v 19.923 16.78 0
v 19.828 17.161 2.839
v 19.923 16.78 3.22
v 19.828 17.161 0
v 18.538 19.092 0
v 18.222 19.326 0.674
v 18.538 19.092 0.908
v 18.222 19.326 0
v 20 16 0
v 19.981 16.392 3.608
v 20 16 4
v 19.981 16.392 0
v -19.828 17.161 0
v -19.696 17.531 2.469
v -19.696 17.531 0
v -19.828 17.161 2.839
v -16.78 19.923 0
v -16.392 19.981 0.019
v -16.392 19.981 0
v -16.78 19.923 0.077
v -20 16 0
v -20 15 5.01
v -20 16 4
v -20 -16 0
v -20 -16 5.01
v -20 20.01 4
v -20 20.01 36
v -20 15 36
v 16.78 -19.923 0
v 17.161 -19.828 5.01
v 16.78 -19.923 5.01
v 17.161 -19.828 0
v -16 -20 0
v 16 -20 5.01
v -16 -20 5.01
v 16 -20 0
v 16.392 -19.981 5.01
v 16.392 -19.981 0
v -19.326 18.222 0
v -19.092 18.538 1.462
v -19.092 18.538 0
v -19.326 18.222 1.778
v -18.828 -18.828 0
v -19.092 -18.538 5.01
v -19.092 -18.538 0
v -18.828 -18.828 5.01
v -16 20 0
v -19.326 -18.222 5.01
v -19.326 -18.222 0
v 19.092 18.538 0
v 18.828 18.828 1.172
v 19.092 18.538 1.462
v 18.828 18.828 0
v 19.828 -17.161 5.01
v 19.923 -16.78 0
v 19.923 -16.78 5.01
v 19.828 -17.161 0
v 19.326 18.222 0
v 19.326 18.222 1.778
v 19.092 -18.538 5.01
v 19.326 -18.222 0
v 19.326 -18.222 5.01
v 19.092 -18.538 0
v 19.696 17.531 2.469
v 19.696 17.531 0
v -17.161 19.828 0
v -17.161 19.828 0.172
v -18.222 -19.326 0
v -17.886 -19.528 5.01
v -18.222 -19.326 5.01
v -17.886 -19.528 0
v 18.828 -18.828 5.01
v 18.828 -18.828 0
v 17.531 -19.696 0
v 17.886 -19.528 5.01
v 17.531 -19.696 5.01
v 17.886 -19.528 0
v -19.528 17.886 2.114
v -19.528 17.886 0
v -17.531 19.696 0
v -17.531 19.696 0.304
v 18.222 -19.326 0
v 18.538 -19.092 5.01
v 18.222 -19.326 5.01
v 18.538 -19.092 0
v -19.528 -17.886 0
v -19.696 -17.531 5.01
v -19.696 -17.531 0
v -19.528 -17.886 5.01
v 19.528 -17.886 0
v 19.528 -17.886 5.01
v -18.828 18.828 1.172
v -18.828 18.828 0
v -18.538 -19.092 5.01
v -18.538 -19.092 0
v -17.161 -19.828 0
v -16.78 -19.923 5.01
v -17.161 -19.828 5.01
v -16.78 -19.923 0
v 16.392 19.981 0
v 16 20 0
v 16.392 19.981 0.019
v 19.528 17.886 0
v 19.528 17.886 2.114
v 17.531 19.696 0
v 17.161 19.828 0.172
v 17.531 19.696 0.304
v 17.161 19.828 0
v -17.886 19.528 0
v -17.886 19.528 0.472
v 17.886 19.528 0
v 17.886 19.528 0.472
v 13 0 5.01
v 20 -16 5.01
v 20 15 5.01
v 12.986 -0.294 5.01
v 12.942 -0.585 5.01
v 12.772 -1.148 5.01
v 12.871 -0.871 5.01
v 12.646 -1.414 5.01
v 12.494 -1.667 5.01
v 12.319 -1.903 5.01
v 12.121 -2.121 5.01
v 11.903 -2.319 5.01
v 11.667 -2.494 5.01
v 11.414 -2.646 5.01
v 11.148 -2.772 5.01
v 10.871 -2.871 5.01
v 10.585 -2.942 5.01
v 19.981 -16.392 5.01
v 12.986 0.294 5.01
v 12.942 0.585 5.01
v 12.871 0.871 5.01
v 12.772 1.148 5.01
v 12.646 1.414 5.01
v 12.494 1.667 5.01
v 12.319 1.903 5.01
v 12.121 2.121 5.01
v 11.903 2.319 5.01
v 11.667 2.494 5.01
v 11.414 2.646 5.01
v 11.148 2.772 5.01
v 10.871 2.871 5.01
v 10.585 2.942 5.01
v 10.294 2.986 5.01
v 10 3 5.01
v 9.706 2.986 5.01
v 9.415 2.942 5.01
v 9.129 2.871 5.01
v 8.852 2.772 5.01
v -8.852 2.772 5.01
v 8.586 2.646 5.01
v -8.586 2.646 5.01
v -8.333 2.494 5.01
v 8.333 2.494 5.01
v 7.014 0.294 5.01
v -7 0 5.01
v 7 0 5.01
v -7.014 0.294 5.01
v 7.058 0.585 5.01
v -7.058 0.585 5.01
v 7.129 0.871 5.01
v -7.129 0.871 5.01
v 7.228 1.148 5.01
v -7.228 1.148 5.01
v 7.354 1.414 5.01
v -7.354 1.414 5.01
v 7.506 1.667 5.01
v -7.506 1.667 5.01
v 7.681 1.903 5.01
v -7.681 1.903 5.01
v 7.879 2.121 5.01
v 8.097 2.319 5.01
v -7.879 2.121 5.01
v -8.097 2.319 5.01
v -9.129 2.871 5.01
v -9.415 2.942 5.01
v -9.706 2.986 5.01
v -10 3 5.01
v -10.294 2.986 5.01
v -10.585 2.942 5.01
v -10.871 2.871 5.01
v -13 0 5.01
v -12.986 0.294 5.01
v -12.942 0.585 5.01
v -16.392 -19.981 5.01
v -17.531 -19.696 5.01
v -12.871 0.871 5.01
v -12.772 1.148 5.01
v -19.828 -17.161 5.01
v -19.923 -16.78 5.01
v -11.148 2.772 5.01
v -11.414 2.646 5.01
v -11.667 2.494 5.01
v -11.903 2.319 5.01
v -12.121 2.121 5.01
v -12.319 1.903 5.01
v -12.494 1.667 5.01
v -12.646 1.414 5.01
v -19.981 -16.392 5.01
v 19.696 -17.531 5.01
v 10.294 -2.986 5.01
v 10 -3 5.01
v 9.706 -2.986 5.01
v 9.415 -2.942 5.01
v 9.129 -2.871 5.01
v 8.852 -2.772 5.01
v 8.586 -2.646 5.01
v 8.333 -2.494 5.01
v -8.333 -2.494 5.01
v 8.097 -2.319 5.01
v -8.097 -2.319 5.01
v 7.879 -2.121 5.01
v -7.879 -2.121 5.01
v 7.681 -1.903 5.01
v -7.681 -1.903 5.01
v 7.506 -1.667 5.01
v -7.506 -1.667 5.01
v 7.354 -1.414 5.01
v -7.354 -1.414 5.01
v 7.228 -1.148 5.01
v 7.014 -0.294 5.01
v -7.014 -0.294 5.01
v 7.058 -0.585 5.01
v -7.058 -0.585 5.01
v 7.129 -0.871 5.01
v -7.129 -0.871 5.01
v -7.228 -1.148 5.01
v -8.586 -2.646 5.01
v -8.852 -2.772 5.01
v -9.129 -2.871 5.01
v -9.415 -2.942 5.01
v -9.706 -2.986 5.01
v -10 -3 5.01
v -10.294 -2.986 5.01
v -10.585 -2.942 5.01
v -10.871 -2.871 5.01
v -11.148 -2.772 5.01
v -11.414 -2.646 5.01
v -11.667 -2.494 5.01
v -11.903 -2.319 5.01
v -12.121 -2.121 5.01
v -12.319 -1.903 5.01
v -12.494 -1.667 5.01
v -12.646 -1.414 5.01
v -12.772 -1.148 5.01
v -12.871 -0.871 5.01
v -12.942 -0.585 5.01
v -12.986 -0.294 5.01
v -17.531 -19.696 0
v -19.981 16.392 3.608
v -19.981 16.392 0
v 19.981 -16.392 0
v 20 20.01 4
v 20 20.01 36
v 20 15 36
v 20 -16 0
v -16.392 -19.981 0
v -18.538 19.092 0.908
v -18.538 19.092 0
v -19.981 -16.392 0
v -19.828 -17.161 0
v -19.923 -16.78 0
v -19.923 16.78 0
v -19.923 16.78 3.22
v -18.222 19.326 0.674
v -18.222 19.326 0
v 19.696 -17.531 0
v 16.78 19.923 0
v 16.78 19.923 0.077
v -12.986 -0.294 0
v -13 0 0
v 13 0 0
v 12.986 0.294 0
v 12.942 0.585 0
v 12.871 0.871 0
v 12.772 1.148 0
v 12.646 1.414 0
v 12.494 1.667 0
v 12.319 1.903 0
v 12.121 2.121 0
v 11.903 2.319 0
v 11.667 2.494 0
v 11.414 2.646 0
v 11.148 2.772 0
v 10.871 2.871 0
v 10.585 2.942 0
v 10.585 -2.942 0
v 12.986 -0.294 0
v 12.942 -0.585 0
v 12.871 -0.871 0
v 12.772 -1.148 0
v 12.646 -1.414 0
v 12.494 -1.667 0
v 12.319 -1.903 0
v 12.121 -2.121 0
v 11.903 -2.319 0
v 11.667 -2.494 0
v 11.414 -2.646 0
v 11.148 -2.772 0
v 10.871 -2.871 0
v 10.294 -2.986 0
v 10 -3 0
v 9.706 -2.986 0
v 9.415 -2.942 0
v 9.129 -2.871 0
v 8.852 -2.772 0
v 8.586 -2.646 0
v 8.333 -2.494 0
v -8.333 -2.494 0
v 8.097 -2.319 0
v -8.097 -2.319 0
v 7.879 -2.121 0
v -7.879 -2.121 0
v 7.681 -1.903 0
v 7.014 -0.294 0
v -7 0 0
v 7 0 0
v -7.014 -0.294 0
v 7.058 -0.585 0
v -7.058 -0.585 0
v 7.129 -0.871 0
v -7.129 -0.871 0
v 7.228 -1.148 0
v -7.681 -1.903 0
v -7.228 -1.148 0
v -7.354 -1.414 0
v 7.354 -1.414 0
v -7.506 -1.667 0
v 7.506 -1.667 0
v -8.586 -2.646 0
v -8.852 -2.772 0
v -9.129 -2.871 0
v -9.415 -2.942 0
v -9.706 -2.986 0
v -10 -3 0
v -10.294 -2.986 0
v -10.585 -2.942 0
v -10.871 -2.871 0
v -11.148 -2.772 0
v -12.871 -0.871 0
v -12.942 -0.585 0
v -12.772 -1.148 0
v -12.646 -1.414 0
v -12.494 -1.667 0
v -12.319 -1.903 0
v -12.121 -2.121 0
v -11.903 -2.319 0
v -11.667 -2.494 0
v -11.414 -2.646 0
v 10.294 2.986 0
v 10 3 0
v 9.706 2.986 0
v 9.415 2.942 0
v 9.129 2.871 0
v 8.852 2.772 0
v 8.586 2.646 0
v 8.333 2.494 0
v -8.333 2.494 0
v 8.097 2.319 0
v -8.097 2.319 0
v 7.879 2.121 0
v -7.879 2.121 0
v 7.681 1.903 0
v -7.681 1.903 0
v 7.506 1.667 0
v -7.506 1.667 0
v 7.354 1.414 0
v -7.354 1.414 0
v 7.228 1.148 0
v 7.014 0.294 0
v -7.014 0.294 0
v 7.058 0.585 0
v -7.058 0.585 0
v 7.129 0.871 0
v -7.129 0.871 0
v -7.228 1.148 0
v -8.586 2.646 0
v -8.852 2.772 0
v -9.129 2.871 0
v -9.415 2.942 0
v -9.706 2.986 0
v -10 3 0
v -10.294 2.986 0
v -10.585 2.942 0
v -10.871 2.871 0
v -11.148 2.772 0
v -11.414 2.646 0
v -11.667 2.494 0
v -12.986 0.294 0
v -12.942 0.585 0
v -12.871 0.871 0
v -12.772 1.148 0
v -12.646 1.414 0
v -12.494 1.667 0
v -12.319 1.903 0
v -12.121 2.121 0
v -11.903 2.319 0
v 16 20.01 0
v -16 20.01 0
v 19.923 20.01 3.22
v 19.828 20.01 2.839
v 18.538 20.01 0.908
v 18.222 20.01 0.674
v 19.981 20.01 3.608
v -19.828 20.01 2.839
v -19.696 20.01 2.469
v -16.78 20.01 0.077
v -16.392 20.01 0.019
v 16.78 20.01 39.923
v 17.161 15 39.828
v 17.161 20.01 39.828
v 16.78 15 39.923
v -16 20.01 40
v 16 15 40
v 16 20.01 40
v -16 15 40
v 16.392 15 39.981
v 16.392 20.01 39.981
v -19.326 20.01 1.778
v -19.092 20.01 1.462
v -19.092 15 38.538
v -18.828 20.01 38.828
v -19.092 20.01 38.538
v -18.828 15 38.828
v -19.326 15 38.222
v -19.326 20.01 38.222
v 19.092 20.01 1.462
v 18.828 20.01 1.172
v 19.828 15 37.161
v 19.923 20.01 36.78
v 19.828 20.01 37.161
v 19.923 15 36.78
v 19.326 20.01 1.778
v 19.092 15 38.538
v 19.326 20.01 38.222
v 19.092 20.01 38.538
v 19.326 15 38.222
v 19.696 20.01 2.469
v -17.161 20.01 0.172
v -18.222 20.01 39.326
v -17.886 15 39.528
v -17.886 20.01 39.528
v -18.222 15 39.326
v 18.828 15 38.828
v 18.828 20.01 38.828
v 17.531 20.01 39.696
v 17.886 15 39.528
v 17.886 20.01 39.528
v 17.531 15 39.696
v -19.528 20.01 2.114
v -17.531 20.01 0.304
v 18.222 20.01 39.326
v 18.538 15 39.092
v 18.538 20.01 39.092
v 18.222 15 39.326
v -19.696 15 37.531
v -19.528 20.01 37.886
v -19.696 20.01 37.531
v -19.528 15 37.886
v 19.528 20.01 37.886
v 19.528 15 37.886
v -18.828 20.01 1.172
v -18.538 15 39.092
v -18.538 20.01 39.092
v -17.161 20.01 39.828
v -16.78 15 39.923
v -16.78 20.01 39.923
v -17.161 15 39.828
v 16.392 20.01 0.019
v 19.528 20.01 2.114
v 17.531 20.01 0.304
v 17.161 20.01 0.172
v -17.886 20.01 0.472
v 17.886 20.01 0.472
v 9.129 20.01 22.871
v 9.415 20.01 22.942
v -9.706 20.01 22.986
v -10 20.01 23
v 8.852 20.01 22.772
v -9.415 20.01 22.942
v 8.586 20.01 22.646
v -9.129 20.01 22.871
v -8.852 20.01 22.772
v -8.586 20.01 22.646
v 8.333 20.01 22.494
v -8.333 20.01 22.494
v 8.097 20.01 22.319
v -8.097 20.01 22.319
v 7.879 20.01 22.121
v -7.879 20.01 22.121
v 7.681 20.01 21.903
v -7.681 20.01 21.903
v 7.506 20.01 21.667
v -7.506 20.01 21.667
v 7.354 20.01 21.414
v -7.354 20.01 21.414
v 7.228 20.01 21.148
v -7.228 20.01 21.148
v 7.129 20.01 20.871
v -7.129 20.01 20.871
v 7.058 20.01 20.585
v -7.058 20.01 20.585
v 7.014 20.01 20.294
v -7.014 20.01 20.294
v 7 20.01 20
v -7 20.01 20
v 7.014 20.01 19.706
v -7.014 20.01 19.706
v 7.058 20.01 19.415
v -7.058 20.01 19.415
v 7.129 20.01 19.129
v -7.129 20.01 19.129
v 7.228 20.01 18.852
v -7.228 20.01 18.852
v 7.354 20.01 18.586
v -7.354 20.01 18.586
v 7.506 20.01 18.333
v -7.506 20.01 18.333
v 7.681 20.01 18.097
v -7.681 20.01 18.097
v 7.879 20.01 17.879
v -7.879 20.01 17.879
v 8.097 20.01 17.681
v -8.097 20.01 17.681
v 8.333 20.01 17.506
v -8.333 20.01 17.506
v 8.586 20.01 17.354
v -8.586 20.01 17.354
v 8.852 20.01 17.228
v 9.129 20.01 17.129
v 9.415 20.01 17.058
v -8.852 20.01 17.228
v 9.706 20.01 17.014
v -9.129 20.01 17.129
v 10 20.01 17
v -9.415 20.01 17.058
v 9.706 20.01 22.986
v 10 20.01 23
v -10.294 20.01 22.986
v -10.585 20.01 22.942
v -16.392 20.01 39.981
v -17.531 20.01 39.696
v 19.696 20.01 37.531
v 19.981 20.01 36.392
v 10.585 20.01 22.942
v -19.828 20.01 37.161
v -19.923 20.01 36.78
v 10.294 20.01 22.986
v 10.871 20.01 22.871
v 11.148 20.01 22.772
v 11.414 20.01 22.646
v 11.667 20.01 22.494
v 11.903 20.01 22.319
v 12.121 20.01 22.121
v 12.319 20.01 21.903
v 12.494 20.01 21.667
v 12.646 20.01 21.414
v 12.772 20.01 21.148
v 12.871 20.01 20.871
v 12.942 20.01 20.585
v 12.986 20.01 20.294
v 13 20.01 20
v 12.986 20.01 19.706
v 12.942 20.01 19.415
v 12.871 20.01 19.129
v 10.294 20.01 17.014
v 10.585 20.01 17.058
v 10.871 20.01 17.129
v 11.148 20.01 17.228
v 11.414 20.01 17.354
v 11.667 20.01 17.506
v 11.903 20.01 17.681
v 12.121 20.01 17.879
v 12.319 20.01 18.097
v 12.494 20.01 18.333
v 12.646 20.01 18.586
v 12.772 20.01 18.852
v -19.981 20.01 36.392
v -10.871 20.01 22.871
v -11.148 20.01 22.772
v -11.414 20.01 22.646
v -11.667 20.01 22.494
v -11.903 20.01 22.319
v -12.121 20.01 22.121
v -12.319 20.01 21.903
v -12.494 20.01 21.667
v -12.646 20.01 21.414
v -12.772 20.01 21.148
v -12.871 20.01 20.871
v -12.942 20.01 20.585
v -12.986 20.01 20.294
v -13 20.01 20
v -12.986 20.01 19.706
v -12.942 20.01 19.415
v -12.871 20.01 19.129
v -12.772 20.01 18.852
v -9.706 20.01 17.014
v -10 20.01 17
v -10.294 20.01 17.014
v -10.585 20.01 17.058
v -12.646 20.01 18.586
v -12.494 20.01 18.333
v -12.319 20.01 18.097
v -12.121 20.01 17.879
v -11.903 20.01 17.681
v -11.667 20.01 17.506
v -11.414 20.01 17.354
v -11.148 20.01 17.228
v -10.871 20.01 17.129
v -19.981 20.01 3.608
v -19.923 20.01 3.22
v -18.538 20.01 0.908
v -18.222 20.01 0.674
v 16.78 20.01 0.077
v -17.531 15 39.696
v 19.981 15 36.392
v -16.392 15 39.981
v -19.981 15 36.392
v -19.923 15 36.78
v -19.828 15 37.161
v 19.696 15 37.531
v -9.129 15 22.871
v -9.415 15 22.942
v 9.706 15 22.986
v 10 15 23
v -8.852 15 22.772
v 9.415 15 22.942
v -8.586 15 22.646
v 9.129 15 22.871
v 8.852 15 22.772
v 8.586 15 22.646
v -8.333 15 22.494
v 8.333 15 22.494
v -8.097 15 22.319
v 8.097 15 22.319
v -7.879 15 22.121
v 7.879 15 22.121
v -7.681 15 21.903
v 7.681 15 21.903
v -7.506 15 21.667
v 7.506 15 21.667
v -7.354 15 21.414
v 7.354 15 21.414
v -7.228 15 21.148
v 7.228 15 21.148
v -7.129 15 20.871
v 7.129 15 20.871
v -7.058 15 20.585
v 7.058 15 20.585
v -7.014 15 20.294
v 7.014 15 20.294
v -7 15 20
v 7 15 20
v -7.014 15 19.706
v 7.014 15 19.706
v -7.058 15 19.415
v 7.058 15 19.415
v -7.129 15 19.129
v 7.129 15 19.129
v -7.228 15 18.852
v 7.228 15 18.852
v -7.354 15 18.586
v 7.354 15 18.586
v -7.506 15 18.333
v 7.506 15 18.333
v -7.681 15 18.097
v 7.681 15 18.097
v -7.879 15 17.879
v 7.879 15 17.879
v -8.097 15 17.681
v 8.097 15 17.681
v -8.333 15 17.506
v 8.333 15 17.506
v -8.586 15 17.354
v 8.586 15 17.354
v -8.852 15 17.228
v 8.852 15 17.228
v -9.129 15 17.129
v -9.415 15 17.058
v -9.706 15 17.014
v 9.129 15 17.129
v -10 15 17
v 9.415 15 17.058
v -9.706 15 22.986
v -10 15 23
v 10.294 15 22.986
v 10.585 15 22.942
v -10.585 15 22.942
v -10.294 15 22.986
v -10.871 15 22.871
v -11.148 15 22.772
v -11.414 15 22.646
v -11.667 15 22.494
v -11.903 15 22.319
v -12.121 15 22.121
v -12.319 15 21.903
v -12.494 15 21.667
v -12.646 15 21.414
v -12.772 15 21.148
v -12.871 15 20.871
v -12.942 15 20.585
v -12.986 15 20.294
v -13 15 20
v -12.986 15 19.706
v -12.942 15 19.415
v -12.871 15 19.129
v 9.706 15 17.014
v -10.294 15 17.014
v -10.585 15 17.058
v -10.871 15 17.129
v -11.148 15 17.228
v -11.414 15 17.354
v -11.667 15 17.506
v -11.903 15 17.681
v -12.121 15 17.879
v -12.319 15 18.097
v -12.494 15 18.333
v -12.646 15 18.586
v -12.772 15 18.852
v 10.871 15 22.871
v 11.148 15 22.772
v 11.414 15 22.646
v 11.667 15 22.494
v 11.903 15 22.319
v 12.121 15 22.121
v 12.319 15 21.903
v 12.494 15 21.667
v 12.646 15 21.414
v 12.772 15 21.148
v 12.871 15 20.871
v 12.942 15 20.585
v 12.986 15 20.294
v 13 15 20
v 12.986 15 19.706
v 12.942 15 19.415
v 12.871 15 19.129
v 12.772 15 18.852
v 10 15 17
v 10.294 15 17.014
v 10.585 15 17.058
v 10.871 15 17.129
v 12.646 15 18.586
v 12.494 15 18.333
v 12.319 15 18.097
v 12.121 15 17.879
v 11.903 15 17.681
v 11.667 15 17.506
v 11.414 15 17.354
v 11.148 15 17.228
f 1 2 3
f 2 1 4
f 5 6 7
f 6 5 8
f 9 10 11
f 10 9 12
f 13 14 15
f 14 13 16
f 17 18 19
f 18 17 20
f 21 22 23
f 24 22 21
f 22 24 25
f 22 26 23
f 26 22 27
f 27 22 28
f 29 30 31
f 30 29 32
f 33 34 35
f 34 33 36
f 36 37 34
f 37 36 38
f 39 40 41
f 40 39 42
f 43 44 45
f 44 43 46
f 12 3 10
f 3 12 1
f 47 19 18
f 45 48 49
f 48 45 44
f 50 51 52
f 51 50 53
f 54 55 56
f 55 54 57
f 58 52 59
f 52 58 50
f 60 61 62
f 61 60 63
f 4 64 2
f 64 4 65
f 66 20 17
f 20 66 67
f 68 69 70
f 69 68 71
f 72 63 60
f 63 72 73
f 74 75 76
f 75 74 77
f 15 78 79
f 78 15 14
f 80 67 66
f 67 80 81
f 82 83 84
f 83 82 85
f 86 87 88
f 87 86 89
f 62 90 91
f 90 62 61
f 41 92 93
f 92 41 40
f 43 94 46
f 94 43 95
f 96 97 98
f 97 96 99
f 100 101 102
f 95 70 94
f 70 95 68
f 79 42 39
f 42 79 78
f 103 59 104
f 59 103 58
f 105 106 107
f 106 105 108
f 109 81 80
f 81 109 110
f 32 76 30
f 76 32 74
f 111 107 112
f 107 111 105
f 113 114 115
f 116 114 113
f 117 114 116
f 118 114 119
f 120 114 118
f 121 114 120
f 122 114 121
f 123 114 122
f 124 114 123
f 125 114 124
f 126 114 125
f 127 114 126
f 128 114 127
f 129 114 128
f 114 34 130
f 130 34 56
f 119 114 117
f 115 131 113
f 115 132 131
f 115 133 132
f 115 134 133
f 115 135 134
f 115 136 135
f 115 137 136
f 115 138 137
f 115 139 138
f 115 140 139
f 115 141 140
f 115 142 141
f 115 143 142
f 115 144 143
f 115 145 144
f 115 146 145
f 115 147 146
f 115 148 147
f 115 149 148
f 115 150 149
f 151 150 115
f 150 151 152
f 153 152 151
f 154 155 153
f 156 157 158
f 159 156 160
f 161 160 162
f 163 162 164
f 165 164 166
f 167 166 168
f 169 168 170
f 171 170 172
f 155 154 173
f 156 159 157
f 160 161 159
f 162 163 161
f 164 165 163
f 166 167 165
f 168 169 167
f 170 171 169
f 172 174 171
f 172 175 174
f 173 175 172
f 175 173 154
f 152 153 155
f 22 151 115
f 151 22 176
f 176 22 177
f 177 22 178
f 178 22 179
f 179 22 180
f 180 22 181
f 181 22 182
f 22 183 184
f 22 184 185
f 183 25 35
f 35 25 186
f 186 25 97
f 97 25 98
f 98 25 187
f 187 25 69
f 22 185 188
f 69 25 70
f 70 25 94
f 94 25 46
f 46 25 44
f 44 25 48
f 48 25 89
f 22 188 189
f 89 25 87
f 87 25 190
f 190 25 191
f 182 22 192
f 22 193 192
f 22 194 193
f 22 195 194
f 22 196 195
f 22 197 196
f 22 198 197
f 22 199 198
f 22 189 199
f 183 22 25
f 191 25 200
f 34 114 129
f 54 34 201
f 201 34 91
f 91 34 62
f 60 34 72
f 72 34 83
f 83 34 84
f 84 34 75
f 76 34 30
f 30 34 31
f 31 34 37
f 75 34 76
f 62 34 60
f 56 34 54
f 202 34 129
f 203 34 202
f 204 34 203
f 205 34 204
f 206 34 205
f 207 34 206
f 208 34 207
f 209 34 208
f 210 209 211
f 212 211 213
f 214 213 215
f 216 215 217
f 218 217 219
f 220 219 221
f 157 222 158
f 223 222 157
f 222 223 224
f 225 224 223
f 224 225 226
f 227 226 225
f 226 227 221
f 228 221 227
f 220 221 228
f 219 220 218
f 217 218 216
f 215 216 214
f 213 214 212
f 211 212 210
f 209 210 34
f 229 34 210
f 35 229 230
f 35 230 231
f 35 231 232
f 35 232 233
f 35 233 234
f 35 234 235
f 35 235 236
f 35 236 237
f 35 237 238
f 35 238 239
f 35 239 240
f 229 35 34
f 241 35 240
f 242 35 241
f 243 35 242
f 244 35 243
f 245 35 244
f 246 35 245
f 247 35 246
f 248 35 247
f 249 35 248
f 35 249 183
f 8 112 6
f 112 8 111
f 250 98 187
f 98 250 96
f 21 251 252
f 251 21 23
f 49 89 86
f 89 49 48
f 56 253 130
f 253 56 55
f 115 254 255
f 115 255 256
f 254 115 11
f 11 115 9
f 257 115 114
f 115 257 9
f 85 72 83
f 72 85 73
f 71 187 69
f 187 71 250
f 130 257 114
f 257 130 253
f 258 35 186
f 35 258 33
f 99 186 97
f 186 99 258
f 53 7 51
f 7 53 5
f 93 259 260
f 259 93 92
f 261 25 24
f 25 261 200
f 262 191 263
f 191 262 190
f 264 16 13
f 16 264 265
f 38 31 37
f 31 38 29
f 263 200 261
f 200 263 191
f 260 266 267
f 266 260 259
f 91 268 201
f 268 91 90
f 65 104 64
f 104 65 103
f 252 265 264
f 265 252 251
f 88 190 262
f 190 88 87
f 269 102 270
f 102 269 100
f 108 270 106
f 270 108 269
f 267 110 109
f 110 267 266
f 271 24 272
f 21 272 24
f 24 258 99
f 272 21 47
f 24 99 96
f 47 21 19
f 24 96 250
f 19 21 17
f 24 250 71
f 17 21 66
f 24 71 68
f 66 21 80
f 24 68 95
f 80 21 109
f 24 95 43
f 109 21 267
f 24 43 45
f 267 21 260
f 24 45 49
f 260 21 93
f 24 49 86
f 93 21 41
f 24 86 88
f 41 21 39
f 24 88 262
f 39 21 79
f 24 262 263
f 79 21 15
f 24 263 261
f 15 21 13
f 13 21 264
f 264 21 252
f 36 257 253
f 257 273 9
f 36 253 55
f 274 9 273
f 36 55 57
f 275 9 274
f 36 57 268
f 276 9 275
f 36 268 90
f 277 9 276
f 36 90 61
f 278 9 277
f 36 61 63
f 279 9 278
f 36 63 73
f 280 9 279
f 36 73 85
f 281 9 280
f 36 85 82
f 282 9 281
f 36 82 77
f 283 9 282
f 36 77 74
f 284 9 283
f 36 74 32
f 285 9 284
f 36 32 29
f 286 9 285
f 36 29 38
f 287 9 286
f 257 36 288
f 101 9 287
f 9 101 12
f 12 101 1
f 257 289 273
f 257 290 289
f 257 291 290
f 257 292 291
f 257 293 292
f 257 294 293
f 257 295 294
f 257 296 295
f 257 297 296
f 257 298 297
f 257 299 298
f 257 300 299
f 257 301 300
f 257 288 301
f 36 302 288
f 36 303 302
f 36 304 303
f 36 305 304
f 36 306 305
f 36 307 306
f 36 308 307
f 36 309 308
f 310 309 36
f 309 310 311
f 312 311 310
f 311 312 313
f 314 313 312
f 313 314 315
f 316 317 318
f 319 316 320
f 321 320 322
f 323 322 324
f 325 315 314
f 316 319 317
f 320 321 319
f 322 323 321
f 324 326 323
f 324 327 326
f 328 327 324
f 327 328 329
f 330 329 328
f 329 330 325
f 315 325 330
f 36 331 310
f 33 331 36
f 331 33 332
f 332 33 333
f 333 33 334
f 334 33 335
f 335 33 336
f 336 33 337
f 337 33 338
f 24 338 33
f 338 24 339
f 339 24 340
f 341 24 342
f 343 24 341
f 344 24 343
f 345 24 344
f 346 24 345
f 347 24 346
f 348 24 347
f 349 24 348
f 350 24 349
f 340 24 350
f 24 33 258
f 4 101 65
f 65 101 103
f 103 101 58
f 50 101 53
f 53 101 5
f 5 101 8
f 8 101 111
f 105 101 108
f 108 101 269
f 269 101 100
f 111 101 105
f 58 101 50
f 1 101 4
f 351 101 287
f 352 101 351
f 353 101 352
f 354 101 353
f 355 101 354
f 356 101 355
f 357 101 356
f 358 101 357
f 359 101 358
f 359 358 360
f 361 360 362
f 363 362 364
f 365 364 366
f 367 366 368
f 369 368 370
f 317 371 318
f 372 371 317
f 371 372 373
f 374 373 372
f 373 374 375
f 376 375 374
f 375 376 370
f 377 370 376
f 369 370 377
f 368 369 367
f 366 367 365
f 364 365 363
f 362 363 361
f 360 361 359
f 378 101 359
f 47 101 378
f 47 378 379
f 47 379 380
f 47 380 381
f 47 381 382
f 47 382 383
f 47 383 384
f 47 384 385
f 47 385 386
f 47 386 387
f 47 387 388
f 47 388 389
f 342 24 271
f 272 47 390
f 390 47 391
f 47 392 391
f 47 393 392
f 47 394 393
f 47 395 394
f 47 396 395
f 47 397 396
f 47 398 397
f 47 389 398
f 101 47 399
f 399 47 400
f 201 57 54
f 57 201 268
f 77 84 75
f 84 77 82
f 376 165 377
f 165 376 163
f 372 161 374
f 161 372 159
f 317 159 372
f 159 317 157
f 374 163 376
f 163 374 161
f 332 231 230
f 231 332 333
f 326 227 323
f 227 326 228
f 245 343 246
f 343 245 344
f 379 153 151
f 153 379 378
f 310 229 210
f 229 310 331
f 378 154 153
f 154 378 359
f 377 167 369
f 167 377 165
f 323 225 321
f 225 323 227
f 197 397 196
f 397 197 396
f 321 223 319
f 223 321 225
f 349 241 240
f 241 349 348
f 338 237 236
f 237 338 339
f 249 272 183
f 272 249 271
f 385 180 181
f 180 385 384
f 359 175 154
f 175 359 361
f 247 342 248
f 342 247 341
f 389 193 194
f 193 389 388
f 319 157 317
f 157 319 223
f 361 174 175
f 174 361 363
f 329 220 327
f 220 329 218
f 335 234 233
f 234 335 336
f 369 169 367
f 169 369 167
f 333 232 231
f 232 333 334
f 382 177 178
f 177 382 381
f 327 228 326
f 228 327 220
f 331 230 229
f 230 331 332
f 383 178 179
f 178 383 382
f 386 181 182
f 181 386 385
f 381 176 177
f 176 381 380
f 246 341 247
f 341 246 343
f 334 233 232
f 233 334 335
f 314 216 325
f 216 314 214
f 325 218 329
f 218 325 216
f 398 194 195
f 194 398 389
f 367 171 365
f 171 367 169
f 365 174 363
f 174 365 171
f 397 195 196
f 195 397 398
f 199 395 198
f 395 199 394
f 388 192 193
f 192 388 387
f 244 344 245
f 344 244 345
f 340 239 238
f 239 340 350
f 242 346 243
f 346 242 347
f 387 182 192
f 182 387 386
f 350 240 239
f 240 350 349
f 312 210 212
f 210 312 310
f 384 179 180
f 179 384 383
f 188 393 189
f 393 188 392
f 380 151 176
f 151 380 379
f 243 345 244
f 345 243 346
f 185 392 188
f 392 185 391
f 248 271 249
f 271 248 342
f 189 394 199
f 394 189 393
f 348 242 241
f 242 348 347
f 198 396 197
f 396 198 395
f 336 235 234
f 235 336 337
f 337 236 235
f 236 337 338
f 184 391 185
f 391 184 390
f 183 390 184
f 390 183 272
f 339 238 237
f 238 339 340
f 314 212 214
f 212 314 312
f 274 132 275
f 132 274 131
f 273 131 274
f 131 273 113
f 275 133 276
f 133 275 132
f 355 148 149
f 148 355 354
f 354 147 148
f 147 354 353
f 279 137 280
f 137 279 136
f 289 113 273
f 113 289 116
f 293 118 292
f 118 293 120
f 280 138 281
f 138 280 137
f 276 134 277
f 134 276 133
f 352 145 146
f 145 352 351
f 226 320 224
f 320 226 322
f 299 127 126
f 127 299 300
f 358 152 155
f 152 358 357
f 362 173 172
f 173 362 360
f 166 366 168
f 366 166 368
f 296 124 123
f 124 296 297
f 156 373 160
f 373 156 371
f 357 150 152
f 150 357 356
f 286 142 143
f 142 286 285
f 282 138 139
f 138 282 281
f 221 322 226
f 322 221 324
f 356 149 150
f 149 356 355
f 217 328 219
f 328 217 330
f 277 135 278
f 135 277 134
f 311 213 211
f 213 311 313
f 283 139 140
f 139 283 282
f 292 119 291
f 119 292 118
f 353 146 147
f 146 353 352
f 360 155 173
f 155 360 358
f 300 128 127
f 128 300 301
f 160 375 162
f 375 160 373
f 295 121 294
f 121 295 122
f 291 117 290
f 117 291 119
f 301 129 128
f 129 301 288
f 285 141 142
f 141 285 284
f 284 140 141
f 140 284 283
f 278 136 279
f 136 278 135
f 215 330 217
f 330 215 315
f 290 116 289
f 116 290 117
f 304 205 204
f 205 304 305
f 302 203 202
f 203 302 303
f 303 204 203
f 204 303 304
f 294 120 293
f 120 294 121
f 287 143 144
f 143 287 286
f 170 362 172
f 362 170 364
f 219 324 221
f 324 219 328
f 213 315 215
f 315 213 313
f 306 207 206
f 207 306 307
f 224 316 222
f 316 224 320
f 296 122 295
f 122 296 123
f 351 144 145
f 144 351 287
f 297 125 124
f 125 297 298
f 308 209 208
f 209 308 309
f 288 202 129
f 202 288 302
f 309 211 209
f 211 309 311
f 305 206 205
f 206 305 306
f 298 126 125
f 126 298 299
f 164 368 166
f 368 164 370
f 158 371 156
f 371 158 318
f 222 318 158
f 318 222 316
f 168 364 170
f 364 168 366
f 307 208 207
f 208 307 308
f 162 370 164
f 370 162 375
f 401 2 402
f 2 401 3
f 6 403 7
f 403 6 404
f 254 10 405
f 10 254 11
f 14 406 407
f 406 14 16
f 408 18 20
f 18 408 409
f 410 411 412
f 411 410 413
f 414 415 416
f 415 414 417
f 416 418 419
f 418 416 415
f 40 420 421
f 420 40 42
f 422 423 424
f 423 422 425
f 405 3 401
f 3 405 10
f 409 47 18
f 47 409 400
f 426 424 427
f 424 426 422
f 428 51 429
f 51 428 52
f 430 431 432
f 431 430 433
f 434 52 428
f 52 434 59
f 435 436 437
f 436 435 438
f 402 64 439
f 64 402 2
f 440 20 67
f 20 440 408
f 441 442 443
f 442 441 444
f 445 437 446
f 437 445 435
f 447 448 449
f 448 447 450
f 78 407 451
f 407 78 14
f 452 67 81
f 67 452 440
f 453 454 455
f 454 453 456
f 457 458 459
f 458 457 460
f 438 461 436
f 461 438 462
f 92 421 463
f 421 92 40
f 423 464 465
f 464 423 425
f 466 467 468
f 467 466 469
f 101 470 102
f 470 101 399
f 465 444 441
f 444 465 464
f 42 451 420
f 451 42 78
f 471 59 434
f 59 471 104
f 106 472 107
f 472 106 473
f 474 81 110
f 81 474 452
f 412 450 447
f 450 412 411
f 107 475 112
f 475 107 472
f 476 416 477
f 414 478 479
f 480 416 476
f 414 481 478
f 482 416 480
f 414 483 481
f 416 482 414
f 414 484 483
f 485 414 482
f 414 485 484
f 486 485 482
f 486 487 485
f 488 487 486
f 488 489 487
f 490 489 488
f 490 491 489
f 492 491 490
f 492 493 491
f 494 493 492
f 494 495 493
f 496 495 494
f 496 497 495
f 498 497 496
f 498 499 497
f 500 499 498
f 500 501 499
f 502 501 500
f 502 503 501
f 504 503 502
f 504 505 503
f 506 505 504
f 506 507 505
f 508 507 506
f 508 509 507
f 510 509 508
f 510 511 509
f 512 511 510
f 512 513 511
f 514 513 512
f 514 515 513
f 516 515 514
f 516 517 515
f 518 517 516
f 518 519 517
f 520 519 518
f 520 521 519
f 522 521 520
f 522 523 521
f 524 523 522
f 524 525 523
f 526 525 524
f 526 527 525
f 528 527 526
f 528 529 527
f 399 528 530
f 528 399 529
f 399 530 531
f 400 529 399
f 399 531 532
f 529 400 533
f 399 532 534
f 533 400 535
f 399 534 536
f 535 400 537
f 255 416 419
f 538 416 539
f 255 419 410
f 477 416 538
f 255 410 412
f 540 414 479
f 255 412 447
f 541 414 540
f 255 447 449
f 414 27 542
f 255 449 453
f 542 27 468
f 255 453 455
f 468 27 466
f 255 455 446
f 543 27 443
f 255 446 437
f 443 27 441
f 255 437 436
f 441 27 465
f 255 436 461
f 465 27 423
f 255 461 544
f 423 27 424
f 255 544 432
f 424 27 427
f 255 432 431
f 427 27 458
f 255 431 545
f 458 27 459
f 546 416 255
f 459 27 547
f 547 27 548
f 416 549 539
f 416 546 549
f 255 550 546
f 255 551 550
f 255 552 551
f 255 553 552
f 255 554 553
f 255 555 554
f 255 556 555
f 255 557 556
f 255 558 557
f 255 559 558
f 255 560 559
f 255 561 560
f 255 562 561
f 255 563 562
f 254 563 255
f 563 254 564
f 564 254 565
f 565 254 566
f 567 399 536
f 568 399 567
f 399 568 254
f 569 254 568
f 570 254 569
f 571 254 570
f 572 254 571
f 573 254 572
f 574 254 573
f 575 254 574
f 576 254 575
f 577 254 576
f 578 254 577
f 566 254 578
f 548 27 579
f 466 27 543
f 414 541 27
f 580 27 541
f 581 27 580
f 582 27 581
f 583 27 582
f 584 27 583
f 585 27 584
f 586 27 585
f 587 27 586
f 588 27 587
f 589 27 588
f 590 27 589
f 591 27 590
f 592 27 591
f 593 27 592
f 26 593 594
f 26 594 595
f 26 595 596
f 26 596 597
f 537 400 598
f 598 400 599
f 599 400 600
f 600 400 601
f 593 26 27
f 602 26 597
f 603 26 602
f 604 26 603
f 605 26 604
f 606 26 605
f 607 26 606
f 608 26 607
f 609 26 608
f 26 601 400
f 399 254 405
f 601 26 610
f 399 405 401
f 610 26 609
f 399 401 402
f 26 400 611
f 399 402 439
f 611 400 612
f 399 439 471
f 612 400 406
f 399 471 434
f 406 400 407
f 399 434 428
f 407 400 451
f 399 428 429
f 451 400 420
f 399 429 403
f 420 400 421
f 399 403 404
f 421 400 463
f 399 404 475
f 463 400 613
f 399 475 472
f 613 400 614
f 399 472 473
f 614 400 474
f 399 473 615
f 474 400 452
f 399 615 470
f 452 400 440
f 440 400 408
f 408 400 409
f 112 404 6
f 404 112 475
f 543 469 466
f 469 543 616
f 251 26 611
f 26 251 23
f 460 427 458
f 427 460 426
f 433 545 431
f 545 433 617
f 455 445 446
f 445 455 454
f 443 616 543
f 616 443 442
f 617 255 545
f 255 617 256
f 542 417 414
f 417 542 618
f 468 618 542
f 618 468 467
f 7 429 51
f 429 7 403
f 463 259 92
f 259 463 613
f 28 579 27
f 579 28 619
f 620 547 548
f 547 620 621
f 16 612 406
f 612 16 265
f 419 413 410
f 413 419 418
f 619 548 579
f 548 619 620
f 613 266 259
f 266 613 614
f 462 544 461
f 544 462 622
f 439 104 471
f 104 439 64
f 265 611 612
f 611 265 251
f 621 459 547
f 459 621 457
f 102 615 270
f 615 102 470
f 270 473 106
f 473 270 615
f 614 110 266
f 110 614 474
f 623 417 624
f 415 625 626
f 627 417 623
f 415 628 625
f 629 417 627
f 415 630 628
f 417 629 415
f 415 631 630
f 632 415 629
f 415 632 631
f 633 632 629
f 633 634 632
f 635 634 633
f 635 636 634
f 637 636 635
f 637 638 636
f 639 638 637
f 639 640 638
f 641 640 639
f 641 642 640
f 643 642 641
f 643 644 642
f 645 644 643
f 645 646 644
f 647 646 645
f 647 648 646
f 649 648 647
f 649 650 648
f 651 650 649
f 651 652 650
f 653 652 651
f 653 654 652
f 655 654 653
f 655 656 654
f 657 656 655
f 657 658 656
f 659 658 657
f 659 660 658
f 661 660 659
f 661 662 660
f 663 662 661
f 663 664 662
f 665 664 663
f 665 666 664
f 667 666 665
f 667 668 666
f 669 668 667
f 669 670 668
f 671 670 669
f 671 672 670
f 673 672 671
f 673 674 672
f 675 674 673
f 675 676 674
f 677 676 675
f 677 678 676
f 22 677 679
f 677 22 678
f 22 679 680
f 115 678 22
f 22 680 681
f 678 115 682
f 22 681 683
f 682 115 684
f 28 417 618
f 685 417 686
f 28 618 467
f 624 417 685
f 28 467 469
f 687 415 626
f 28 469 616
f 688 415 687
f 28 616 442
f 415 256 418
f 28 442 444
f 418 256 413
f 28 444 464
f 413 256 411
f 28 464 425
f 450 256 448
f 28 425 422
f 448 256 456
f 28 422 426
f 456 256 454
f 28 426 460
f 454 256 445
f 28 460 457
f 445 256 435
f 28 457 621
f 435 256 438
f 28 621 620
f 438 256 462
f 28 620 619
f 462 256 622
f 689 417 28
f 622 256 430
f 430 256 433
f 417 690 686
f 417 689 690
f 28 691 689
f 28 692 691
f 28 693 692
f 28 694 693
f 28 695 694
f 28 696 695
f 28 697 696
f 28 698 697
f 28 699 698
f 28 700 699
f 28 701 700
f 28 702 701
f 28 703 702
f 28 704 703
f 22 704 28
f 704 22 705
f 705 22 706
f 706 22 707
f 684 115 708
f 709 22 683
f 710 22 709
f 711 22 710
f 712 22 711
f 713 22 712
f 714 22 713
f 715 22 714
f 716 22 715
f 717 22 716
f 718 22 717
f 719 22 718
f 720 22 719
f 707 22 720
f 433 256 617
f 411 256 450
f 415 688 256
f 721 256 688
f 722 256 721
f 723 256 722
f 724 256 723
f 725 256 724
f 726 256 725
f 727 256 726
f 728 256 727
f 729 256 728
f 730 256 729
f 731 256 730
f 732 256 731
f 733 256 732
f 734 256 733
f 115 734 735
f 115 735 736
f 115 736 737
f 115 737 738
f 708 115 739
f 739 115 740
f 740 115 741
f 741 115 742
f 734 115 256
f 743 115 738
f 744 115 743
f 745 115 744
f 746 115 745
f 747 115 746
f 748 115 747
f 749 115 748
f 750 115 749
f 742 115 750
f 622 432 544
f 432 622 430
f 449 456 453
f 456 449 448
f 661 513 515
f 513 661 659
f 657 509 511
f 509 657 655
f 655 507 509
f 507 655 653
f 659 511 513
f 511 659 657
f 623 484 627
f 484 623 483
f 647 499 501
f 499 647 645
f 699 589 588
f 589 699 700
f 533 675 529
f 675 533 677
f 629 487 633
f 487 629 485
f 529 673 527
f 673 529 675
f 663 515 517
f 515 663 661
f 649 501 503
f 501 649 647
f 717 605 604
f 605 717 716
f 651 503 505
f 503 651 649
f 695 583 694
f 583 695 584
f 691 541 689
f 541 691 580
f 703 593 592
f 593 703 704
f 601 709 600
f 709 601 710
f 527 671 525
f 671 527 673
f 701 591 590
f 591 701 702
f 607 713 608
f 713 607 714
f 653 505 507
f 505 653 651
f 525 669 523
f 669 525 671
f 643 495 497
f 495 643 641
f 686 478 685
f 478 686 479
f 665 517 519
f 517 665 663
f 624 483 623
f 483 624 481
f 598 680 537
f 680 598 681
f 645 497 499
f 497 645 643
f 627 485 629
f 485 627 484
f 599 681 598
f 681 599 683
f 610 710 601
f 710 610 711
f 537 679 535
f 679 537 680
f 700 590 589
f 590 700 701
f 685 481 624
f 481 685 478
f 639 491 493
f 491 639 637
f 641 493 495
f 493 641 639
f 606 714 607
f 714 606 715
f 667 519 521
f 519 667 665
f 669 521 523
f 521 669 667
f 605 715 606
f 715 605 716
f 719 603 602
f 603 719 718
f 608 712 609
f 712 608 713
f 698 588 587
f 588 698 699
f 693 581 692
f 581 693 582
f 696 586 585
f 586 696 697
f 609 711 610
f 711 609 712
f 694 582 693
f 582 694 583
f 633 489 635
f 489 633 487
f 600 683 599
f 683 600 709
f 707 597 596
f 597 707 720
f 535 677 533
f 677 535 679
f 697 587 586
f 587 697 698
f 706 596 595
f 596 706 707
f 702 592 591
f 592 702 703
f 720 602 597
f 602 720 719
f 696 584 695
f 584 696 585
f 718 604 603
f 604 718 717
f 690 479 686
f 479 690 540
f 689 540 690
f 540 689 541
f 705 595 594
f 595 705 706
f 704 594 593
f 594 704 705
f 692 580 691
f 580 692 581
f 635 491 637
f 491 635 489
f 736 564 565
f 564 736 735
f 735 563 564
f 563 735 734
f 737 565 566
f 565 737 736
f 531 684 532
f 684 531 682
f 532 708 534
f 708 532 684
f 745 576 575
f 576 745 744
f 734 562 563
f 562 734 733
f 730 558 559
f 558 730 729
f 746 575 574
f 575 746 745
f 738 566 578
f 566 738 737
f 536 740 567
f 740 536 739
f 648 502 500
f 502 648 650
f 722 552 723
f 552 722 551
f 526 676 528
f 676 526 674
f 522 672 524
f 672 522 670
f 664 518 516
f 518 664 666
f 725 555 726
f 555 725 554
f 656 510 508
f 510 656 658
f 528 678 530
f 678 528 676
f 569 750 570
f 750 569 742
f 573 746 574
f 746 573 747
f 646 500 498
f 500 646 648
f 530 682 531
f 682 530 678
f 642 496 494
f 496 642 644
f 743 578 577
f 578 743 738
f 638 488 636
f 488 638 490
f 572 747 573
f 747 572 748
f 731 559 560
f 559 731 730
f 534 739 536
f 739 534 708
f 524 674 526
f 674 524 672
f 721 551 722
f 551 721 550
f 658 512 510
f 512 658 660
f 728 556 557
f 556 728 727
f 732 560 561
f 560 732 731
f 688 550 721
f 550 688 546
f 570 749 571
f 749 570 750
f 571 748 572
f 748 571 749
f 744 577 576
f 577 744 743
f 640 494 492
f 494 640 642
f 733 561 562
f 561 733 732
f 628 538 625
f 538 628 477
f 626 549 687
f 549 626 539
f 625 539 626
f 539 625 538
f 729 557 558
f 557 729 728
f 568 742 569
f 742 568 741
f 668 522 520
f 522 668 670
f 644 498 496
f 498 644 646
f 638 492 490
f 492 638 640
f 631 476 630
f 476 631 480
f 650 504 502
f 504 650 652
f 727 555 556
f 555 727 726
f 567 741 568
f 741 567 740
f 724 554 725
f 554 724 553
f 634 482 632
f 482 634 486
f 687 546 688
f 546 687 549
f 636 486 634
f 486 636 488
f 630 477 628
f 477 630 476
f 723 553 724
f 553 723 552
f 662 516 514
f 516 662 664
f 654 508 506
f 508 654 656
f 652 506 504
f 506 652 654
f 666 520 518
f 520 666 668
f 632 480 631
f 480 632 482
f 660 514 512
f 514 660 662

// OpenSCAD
outer_size = 40;
thickness = 5;
r = 4;
hole_d = 6;
hole_spacing = 20;
$fn = 64;

module rounded_plate() {
    minkowski() {
        cube([outer_size - 2*r, outer_size - 2*r, thickness], center = true);
        cylinder(r = r, h = 0.01, $fn = $fn);
    }
}

module plate_with_holes() {
    difference() {
        rounded_plate();
        translate([-hole_spacing/2, 0, -thickness])
            cylinder(d = hole_d, h = thickness * 3, $fn = $fn);
        translate([hole_spacing/2, 0, -thickness])
            cylinder(d = hole_d, h = thickness * 3, $fn = $fn);
    }
}

union() {
    // bottom arm
    translate([0, 0, thickness/2])
        plate_with_holes();

    // vertical arm (rotated and touching the bottom arm)
    translate([0, outer_size/2 - thickness/2, outer_size/2])
        rotate([-90, 0, 0])
        plate_with_holes();
}
